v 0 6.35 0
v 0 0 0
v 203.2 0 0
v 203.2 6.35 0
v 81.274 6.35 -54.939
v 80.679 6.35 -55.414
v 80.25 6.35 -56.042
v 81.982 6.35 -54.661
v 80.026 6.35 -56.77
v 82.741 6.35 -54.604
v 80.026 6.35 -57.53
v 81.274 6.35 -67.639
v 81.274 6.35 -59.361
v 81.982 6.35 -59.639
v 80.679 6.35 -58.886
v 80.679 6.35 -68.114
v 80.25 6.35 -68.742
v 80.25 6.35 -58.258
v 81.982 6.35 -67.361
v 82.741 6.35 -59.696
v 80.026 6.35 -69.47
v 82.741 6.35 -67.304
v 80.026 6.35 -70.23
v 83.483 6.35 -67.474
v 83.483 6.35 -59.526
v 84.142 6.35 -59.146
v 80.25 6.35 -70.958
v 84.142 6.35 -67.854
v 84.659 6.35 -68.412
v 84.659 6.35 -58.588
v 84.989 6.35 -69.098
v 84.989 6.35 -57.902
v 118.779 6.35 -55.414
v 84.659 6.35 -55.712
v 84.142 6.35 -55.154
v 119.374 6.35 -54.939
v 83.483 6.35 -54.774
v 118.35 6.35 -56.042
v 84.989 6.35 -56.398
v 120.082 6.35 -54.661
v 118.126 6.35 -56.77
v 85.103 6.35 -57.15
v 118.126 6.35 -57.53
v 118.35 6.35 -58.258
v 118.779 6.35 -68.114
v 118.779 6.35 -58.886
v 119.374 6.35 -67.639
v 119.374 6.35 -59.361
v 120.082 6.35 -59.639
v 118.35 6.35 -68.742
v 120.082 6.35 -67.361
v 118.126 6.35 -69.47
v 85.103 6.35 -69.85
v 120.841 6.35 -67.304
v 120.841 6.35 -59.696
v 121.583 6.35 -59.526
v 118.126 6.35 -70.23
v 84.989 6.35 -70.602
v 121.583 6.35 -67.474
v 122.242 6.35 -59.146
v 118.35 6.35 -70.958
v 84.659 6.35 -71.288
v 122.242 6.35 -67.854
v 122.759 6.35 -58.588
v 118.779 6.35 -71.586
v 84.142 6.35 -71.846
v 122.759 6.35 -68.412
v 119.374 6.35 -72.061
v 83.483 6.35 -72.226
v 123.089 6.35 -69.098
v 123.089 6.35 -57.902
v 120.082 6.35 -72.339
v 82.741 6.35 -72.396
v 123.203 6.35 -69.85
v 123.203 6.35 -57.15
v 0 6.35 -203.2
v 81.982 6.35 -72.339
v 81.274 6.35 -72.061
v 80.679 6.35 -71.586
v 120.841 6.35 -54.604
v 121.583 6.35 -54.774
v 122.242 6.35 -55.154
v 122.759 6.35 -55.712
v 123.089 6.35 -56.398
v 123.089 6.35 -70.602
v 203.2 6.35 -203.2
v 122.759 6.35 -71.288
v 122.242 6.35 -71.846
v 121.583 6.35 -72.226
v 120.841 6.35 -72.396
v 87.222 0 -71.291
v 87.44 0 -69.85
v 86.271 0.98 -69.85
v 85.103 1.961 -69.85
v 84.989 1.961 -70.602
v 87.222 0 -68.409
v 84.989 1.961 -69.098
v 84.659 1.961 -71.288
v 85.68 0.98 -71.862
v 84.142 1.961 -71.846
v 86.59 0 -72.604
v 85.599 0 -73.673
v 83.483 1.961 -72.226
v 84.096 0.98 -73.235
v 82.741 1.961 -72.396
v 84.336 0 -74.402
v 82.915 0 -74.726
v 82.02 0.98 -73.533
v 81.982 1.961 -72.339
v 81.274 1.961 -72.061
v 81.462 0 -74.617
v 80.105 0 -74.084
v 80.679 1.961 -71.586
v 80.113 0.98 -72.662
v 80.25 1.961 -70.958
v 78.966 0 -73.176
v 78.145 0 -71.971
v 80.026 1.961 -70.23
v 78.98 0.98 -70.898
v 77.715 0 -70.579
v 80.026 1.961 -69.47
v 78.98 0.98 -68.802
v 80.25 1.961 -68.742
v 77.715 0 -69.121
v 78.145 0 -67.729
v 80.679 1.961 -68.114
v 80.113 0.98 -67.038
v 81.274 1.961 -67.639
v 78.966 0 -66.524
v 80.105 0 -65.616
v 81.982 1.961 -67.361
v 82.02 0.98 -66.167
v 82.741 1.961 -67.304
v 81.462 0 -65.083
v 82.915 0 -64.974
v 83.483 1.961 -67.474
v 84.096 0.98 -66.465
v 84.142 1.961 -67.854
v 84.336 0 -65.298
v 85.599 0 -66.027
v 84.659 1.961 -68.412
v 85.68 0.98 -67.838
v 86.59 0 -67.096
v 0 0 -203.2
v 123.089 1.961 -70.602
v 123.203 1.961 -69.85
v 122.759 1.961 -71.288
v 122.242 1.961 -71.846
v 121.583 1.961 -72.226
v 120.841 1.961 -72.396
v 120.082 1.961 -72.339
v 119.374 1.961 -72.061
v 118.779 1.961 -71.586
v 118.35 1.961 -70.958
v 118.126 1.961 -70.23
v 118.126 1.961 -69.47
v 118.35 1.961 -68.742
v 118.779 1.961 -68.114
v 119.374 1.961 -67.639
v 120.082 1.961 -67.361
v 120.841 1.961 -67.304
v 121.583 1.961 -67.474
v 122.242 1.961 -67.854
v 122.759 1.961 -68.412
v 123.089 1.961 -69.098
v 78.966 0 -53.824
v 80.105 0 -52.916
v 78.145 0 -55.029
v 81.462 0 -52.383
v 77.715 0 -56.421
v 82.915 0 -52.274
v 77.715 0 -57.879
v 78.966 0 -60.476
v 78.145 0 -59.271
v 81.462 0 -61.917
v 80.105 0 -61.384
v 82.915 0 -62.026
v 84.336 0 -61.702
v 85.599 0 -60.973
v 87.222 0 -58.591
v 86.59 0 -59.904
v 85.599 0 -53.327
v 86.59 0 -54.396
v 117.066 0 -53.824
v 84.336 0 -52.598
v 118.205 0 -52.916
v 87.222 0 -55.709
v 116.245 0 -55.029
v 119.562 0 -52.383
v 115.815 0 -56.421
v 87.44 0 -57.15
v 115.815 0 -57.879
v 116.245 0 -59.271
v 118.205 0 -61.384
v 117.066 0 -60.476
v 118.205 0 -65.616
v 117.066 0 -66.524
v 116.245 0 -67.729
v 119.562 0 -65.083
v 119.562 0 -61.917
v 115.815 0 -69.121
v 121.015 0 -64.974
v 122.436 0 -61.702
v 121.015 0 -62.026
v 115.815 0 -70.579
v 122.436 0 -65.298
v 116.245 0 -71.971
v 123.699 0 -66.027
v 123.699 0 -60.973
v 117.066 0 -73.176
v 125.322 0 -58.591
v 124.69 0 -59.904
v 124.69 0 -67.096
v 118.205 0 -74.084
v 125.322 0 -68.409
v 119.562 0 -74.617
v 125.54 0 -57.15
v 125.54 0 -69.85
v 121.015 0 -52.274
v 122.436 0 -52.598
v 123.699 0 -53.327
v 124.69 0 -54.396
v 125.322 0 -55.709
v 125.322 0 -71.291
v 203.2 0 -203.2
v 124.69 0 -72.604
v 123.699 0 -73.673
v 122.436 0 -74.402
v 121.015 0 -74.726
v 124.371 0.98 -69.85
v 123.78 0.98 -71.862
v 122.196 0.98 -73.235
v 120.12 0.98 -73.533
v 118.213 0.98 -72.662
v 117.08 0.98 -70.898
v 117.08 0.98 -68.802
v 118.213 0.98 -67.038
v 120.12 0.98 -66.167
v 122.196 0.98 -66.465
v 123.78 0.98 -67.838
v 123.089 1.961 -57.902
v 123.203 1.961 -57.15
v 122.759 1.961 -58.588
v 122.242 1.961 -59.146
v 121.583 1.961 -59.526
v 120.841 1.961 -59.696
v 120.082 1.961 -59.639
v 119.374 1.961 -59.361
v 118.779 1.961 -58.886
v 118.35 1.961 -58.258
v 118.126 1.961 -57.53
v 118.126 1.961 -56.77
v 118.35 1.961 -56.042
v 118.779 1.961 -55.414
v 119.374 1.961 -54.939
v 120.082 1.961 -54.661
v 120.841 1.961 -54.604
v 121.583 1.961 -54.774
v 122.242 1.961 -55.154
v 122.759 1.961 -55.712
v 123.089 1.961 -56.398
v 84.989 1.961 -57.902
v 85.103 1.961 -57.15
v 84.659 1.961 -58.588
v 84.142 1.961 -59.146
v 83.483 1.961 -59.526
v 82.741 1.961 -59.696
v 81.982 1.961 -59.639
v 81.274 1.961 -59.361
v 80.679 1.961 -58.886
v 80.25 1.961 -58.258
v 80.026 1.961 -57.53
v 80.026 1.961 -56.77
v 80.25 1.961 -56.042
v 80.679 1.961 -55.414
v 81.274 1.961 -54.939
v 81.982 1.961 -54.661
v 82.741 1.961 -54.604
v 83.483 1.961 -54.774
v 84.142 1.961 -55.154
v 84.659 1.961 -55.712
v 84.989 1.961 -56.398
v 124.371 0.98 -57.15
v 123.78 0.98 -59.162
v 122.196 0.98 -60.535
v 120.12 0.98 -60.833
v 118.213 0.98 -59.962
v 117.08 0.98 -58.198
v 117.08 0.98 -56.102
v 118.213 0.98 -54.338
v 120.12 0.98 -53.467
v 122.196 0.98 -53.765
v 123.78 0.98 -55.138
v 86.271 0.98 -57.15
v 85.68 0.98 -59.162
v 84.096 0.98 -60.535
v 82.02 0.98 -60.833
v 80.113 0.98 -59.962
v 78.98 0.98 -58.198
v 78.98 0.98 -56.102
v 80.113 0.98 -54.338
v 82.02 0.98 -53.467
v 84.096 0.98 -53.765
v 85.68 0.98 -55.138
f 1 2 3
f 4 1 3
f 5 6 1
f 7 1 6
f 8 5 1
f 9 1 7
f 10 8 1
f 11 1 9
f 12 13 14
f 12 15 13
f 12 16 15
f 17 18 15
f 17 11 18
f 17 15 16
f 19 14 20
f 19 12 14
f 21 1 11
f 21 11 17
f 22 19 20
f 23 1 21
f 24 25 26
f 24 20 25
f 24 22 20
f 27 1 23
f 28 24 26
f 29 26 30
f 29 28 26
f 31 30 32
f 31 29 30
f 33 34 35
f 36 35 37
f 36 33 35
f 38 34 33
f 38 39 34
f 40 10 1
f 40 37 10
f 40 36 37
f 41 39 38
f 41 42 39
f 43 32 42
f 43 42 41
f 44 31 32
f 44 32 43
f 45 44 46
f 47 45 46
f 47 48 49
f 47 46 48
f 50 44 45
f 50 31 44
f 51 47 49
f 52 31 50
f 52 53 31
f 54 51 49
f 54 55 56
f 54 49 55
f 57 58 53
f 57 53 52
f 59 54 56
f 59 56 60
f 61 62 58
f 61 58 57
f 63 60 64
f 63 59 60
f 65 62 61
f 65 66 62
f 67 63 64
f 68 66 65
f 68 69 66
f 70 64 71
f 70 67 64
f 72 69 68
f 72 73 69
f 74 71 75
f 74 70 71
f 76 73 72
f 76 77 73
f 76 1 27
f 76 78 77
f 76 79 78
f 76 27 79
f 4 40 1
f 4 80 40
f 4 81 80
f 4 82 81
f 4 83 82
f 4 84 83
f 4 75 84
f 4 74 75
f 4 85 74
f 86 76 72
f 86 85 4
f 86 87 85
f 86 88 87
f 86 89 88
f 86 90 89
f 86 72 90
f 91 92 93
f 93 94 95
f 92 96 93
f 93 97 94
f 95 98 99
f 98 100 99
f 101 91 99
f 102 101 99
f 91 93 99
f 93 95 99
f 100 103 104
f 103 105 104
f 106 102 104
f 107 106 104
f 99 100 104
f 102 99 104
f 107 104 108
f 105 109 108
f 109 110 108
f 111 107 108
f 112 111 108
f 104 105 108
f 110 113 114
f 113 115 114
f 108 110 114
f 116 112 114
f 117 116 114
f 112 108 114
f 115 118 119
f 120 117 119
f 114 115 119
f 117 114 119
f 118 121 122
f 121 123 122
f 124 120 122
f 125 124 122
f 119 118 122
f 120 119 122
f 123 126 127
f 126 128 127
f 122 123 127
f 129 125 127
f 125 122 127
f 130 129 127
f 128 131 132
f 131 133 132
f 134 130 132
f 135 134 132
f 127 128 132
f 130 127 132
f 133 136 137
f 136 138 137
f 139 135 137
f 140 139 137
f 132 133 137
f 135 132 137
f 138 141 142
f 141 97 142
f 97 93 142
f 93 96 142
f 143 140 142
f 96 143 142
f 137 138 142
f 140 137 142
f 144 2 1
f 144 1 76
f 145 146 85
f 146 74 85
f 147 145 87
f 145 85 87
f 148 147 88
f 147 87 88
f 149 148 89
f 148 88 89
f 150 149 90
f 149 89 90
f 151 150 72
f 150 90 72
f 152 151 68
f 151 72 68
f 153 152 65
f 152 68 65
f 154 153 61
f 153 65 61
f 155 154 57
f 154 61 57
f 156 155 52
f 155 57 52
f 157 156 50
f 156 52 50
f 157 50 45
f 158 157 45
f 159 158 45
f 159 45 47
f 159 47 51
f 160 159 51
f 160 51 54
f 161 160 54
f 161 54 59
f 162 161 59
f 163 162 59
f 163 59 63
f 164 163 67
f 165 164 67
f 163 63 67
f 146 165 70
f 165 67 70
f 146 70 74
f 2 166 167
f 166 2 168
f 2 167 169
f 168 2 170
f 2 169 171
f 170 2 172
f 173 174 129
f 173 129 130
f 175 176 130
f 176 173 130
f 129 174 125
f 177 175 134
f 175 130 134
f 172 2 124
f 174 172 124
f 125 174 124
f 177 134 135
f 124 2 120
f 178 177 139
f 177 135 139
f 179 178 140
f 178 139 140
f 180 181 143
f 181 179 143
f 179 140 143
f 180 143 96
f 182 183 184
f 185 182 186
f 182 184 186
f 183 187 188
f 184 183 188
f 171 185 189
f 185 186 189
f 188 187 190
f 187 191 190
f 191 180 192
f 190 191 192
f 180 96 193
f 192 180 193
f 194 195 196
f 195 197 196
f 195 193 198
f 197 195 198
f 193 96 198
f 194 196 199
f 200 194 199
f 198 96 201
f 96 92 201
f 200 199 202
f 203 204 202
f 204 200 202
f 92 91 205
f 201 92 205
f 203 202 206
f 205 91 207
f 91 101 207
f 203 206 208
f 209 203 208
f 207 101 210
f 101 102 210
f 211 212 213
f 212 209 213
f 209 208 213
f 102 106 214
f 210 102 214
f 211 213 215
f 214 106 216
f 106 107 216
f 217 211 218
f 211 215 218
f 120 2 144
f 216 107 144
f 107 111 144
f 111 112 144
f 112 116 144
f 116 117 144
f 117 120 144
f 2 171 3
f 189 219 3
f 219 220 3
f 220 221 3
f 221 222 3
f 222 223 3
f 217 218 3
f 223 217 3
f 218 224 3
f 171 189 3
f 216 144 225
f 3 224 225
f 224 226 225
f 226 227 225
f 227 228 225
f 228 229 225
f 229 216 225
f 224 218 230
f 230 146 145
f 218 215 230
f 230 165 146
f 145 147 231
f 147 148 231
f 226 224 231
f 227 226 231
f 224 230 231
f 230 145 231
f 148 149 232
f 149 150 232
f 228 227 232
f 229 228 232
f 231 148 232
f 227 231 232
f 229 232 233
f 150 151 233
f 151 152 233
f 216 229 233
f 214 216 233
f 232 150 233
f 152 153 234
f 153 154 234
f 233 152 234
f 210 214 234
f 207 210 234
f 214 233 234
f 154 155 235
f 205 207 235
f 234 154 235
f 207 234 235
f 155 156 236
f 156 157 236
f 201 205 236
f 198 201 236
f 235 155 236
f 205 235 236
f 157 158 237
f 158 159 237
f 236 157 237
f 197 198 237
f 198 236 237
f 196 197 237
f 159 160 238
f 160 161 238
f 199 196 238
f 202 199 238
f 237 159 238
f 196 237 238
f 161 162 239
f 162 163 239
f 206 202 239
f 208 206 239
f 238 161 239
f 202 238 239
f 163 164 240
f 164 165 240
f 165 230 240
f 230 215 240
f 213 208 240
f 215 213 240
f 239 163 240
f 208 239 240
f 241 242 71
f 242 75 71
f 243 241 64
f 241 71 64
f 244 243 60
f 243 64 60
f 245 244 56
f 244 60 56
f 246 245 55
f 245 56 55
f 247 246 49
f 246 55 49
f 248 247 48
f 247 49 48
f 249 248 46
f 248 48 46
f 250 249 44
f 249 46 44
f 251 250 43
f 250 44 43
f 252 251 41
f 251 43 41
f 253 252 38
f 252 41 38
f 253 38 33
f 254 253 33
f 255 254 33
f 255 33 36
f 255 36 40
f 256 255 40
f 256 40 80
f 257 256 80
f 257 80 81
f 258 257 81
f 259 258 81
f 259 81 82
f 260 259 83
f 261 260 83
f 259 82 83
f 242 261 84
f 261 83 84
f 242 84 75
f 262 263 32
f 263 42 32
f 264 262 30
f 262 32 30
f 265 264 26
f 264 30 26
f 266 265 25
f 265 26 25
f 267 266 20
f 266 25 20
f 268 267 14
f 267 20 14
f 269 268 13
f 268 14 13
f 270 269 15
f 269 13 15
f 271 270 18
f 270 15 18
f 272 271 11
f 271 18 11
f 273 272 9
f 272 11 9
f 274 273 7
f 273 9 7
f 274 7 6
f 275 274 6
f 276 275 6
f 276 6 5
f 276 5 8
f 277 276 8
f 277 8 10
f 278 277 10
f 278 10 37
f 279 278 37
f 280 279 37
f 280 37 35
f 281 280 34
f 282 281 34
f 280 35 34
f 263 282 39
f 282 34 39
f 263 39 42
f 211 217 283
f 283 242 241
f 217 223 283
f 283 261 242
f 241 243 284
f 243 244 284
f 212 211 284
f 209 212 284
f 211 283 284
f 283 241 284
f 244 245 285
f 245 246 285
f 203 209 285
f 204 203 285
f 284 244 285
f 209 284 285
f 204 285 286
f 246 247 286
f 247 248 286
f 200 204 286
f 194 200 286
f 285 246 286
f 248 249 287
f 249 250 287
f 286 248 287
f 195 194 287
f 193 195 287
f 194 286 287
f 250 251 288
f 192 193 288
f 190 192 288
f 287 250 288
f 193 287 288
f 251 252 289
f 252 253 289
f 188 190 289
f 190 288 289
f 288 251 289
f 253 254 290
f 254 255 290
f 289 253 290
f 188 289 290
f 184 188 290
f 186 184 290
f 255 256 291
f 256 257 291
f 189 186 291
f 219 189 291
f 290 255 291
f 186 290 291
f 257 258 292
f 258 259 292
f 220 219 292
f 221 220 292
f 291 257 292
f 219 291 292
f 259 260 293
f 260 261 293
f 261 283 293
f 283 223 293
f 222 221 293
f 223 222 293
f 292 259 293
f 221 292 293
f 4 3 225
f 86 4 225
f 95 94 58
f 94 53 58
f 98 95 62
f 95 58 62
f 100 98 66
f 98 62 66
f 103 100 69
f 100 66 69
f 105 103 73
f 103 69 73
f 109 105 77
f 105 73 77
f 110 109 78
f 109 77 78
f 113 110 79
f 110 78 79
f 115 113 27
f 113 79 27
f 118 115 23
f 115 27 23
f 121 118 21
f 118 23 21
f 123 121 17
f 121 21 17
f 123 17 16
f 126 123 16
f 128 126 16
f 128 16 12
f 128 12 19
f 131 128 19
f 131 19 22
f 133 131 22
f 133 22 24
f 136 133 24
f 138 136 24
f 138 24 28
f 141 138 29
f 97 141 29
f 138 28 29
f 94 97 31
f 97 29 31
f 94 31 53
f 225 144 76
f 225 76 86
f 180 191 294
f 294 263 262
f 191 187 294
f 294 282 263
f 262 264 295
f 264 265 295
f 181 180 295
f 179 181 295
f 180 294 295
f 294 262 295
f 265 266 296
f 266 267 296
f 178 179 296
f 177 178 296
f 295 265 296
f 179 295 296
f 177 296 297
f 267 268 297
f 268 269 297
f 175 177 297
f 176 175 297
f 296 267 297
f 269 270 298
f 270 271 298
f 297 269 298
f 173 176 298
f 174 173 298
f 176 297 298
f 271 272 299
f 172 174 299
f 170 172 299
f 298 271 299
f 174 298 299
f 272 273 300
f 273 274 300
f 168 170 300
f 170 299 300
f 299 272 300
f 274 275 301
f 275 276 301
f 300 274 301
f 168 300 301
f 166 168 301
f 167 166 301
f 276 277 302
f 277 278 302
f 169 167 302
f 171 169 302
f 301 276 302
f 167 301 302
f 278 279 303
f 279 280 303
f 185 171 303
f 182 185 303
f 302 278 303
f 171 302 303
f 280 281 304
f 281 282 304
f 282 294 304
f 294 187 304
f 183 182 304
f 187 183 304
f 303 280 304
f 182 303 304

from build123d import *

# Parameters (mm, degrees)
SKETCH2_W                                          = 203.2
SKETCH2_H                                          = 203.2
BOSS_EXTRUDE2_DEPTH                                = 6.35
CSK_FOR_10_FLAT_HEAD_MACHINE_SCREW_100_D           = 5.1054
CSK_FOR_10_FLAT_HEAD_MACHINE_SCREW_100_CSINK_D     = 9.779
CSK_FOR_10_FLAT_HEAD_MACHINE_SCREW_100_CSINK_ANGLE = 100


with BuildPart() as part:
    # Sketch2 → Boss-Extrude2 (new body)
    with BuildSketch(Plane(origin=(0, 0, 0), x_dir=(1, 0, 0), z_dir=(0, 1, 0))):
        with Locations((101.6, 101.6)):
            Rectangle(SKETCH2_W, SKETCH2_H)
    extrude(amount=BOSS_EXTRUDE2_DEPTH)

    # CSK for #10 Flat Head Machine Screw (100)1 (through all)
    with Locations(Plane(origin=(0, 0, 0), x_dir=(-1, 0, 0), z_dir=(0, -1, 0))):
        with Locations((-82.55, 57.15), (-82.55, 69.85), (-120.65, 57.15), (-120.65, 69.85)):
            CounterSinkHole(CSK_FOR_10_FLAT_HEAD_MACHINE_SCREW_100_D / 2, CSK_FOR_10_FLAT_HEAD_MACHINE_SCREW_100_CSINK_D / 2, counter_sink_angle=CSK_FOR_10_FLAT_HEAD_MACHINE_SCREW_100_CSINK_ANGLE)


solid = part.part
